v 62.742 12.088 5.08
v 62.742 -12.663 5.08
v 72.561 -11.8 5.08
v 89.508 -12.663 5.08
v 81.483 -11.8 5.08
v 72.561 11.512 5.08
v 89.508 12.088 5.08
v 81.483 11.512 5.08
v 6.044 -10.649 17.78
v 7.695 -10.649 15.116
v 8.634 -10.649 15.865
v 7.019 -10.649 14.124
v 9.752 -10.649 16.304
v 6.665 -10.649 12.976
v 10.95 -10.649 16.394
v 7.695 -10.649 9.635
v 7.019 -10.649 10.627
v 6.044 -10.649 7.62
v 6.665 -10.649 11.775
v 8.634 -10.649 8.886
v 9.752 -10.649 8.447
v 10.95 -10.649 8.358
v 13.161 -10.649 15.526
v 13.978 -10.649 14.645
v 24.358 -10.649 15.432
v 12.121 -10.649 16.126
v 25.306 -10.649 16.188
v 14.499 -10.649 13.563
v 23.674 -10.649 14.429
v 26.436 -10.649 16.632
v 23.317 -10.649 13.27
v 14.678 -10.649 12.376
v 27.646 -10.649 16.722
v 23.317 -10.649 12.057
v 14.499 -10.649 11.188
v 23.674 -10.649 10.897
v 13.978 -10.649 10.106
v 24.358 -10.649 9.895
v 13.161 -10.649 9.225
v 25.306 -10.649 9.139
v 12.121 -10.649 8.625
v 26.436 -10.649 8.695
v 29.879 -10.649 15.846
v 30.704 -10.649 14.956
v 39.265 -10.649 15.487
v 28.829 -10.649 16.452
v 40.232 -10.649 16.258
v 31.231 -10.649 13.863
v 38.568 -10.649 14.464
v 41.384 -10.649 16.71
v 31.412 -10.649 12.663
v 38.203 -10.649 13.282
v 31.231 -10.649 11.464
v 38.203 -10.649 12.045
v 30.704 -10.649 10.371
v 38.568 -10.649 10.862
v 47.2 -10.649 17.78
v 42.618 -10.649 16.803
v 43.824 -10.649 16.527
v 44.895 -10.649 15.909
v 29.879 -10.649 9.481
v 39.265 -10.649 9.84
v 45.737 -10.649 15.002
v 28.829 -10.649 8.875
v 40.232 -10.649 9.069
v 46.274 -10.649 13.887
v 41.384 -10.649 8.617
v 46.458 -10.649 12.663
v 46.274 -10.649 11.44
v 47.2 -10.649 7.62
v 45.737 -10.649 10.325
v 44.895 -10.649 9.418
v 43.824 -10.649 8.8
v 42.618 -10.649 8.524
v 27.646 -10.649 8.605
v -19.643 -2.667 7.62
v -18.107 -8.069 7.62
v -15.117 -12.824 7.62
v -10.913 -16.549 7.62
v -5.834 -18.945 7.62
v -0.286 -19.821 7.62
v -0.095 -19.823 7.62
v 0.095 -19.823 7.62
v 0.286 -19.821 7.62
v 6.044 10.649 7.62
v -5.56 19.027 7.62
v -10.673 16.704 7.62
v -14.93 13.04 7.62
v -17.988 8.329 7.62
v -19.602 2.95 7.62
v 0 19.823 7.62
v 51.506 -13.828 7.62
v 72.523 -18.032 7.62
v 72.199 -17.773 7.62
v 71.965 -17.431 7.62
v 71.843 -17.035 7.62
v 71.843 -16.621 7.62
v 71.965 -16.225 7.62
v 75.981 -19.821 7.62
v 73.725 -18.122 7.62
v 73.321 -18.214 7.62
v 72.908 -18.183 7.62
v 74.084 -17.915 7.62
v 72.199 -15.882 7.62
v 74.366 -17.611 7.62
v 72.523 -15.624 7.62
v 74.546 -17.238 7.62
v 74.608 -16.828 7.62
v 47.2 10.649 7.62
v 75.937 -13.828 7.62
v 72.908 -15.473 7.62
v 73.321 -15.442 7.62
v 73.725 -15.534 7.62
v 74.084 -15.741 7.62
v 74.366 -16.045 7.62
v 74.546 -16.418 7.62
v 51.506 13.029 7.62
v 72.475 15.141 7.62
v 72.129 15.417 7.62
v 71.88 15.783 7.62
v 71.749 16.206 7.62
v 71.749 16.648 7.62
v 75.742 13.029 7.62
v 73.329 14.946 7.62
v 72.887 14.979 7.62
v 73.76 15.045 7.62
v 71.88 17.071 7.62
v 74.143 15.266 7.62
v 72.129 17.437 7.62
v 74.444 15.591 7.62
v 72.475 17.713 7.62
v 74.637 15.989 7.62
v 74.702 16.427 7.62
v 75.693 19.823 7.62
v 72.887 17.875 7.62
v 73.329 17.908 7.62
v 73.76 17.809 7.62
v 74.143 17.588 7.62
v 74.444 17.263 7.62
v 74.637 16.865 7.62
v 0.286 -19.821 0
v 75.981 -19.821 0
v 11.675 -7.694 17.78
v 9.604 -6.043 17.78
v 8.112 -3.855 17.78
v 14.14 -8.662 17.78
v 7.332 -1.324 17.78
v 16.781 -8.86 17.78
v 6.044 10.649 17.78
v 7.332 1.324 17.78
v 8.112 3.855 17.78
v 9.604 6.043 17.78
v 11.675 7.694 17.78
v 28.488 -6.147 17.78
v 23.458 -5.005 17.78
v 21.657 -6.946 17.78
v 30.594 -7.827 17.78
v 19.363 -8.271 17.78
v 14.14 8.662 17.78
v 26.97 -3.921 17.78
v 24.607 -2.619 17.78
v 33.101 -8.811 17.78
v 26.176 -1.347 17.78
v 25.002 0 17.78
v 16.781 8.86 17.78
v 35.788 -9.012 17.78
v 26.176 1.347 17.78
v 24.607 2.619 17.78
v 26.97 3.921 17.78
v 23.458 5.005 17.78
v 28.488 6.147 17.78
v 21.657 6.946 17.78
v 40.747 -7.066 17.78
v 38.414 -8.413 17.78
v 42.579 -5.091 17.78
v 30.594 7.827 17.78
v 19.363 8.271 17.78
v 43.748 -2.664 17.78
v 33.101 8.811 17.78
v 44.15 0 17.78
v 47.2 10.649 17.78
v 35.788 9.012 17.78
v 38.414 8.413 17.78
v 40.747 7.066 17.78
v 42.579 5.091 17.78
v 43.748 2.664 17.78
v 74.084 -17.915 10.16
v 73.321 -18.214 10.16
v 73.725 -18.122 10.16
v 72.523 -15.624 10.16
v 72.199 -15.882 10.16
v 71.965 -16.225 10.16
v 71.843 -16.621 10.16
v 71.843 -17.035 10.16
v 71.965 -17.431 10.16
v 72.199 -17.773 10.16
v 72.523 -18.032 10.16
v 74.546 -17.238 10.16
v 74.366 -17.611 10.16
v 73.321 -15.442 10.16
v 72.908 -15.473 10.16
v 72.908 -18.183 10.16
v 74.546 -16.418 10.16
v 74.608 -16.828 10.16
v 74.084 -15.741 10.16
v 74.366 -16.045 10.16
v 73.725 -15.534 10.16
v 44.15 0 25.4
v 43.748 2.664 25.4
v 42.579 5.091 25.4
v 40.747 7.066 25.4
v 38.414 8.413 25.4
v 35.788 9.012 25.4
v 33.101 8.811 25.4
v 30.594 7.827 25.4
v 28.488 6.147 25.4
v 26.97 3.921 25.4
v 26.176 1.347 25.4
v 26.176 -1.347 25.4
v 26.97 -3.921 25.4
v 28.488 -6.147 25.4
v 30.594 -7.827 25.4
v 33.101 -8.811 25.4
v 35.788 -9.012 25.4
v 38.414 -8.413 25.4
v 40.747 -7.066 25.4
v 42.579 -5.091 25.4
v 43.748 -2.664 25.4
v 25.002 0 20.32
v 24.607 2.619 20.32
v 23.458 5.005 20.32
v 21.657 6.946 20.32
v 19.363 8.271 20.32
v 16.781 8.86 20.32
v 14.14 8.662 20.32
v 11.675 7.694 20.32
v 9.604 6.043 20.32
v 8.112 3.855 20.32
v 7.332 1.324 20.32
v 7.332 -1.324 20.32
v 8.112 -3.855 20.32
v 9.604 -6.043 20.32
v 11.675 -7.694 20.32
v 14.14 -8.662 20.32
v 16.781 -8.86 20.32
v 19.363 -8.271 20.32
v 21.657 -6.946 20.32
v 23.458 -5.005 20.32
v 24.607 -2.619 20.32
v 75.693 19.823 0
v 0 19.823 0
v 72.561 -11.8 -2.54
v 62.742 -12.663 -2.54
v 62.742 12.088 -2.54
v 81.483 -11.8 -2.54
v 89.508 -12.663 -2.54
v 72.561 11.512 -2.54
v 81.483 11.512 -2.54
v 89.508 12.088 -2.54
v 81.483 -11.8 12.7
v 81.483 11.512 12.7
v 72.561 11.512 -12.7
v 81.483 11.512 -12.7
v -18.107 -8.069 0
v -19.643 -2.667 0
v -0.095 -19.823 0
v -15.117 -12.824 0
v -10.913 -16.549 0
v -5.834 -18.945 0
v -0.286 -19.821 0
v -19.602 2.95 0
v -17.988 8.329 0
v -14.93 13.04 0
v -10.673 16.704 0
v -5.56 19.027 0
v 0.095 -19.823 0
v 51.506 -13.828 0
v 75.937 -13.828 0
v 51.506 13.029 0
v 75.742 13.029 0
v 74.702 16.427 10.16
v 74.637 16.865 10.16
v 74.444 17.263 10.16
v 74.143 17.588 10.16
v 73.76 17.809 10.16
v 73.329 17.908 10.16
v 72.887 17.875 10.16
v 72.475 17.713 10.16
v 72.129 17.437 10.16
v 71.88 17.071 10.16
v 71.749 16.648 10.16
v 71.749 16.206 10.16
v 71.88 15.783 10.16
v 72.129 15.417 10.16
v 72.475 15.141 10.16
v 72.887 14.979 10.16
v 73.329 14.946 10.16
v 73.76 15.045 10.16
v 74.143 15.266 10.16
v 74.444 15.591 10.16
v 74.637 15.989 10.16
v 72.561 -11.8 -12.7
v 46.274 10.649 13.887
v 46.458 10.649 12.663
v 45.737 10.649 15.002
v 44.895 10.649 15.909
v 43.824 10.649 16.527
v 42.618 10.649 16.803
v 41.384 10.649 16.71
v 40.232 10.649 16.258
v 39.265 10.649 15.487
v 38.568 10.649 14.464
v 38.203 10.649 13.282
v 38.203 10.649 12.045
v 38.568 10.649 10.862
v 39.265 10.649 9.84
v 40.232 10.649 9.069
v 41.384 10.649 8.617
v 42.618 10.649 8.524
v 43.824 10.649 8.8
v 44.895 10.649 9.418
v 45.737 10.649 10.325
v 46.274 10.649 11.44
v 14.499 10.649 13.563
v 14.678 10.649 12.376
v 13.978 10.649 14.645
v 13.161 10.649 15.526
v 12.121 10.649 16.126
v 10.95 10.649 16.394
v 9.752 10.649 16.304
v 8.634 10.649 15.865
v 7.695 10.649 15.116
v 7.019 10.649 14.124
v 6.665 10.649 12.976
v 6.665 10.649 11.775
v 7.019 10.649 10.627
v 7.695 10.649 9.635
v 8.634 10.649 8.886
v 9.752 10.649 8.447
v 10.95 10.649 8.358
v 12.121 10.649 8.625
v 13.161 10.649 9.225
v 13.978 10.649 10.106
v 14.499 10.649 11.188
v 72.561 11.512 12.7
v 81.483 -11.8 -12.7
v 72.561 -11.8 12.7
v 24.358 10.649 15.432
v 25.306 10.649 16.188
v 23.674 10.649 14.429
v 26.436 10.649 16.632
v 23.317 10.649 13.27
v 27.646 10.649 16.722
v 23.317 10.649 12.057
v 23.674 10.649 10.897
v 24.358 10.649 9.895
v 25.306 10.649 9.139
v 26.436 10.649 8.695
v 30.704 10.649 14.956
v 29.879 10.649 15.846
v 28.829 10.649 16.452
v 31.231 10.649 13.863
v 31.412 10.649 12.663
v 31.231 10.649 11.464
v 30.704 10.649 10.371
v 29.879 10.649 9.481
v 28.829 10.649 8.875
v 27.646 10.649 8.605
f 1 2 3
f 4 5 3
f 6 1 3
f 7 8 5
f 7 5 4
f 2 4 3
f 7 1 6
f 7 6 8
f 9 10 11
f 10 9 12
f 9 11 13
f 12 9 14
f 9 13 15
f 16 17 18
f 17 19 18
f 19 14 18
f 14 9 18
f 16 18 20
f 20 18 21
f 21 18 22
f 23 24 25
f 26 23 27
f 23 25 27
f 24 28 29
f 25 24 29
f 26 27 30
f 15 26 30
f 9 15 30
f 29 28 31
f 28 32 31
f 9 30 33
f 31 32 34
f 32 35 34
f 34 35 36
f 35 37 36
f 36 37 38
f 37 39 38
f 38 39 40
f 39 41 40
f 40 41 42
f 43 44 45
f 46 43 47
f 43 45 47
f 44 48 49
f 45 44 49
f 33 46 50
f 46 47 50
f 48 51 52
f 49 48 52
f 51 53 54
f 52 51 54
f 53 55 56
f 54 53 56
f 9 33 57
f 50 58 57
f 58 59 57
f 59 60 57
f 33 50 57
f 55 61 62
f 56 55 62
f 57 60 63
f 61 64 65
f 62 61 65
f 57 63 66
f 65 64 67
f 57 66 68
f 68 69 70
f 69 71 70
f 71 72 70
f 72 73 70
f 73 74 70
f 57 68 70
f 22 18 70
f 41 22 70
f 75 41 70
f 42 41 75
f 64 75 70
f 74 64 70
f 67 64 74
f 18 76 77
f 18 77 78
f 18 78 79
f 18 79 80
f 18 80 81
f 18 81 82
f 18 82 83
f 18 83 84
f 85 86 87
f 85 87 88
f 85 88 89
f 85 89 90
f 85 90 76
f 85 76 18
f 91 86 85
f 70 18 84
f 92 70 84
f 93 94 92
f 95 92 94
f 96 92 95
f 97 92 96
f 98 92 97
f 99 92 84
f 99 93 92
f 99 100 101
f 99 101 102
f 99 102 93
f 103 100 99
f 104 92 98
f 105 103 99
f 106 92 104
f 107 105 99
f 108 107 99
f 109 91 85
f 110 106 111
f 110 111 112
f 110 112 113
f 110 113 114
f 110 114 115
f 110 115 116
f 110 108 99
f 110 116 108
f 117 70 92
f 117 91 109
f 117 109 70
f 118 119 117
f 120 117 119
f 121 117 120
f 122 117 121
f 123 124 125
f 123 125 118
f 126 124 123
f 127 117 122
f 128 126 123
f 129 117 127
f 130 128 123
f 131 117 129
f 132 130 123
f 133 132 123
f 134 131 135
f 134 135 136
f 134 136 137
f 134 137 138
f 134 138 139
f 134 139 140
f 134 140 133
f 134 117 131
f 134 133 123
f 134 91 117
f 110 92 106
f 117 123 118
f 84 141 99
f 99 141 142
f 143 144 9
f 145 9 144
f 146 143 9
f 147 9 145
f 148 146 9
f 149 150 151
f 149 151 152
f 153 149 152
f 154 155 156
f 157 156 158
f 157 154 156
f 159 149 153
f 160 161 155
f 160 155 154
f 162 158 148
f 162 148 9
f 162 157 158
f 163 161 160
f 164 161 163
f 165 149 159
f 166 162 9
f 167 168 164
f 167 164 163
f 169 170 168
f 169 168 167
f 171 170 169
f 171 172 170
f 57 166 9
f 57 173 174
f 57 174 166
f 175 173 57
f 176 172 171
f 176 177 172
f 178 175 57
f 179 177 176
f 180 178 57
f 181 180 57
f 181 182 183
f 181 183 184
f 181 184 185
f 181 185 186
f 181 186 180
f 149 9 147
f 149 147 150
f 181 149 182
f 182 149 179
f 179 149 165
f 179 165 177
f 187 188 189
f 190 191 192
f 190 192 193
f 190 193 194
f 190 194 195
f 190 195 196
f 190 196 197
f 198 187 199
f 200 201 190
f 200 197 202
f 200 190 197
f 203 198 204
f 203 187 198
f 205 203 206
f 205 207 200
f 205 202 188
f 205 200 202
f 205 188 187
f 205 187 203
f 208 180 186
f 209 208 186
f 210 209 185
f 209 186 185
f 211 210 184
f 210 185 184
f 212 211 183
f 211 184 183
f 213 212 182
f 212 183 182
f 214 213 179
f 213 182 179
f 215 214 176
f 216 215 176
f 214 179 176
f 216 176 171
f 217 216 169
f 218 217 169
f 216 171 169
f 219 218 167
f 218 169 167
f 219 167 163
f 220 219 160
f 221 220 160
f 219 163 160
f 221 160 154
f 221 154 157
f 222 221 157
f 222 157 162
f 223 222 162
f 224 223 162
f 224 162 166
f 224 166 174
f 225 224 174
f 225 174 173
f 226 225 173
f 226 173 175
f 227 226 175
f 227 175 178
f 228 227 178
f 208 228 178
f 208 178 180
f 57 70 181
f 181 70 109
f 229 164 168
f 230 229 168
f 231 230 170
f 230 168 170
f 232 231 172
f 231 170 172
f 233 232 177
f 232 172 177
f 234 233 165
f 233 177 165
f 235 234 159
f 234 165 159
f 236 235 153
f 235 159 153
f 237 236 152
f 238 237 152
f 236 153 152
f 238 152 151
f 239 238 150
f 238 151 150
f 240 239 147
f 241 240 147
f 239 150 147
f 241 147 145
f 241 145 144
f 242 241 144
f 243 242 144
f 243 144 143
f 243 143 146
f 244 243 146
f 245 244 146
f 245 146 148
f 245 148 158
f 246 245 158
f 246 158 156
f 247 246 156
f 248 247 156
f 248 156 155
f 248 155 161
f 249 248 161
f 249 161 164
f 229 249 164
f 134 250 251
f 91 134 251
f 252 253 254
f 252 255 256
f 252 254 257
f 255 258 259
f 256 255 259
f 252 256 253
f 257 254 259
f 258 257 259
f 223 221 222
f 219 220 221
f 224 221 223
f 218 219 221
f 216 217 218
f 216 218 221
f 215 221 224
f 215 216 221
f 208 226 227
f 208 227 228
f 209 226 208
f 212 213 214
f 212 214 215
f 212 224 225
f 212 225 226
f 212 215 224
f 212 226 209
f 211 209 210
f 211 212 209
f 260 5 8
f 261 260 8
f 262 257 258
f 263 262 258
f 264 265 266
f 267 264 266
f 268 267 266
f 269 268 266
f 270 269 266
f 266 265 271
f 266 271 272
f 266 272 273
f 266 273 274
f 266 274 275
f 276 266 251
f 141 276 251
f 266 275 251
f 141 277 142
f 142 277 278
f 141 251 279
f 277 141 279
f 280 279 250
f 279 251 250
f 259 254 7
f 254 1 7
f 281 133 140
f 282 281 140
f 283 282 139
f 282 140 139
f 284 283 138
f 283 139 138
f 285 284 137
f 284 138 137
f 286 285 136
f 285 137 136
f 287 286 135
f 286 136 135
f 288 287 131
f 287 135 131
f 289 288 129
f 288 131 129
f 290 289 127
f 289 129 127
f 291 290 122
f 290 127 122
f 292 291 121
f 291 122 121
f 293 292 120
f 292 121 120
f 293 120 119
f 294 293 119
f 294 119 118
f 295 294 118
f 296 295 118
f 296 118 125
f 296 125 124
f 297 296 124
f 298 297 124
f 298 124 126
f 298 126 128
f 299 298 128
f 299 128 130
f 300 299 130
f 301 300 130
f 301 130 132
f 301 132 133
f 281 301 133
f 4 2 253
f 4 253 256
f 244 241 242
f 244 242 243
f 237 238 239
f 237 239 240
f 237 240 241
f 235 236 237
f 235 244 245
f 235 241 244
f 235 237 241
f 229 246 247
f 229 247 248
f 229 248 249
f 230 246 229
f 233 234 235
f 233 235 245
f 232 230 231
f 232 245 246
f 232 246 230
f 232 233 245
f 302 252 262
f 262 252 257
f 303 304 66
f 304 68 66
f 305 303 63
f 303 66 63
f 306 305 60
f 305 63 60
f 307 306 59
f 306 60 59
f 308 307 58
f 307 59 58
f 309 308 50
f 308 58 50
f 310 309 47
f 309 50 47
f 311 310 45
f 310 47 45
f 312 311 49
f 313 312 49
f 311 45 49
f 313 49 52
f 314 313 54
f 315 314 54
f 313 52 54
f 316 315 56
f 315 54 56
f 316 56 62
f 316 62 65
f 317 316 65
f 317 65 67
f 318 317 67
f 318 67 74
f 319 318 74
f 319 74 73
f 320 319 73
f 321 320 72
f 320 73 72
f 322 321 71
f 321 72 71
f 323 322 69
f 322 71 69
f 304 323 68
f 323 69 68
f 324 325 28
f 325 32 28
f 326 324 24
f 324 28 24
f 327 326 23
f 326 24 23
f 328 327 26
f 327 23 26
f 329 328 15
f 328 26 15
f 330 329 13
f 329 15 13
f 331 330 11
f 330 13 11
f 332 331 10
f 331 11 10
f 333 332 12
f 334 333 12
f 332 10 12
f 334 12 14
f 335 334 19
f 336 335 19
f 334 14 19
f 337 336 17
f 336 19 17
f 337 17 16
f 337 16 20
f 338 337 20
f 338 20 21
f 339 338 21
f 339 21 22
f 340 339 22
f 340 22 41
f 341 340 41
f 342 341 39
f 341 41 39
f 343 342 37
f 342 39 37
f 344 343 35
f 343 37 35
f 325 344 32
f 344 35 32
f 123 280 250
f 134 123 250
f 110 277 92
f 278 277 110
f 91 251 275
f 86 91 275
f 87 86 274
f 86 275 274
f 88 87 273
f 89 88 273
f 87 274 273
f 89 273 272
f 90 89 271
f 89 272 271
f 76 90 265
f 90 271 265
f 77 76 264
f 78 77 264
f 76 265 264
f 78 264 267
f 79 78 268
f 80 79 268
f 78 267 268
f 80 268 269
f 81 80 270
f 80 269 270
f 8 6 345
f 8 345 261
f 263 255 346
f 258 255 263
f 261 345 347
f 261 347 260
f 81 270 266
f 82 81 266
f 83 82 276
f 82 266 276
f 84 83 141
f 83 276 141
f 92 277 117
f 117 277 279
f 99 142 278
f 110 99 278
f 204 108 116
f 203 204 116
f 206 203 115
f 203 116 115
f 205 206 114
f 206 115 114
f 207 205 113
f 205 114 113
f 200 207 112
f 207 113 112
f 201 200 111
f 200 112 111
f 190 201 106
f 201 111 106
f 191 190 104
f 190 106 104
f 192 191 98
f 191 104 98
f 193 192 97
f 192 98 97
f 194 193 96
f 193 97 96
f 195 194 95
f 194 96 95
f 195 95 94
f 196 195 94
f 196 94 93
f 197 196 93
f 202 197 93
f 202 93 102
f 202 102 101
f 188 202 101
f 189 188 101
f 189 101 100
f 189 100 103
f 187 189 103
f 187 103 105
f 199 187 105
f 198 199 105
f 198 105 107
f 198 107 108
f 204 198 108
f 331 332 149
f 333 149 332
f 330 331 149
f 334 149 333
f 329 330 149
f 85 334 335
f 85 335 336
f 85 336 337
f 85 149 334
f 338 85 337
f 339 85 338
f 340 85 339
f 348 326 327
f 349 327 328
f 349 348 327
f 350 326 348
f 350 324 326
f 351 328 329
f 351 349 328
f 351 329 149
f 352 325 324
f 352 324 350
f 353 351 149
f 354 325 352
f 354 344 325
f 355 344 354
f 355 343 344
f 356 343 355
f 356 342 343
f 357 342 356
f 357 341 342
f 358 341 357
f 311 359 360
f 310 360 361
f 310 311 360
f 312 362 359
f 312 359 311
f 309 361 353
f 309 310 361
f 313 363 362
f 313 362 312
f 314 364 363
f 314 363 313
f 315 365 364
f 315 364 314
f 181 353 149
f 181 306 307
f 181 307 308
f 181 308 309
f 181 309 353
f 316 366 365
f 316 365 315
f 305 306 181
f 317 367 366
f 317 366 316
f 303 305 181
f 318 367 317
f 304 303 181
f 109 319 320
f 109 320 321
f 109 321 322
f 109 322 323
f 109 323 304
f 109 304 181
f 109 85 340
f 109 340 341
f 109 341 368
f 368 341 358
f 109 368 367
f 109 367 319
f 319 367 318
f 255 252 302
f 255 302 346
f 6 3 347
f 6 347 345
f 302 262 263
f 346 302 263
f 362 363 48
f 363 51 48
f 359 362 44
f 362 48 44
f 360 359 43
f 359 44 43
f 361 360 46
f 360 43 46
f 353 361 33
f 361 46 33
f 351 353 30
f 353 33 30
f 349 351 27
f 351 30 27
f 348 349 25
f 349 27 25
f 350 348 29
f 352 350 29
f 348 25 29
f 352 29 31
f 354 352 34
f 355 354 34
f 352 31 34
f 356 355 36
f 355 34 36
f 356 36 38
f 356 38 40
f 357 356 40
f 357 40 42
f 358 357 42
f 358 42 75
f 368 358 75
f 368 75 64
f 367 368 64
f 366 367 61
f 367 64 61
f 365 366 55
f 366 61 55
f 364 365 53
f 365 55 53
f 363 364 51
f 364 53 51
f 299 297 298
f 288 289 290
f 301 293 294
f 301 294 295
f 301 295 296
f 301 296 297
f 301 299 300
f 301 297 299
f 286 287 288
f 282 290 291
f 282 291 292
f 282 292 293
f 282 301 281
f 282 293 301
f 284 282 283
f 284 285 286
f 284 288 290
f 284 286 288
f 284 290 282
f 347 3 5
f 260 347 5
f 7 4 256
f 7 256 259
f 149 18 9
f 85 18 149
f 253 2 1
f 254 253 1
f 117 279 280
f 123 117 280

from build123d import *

# Parameters (mm, degrees)
F1_DEPTH       = 7.62
F2_W           = 17.2683522105
F2_H           = 26.7659360543
F3_DEPTH       = 12.7
F4_W           = 41.1562207155
F4_H           = 21.2976261973
F5_DEPTH       = 17.78
F6_R           = 8.8847627662
F7_DEPTH       = 20.32
F8_R           = 9.0372818925
F9_DEPTH       = 25.4
F10_R          = 4.0292833
F10_R_2        = 4.0701887274
F10_R_3        = 4.1507926028
F11_DEPTH      = 25.4
F11_DEPTH_BACK = 25.4
F12_W          = 26.7398282886
F12_H          = 26.8571125343
F13_DEPTH      = 25.4
F13_DEPTH_BACK = 25.4
F14_R          = 1.3901606725
F14_R_2        = 1.4848965251
F15_DEPTH      = 10.16
F16_W          = 26.7659276724
F16_H          = 24.7512953356
F17_DEPTH      = 5.08
F17_DEPTH_BACK = 2.54
F18_W          = 8.9219808578
F18_H          = 23.312266916
F19_DEPTH      = 12.7
F19_DEPTH_BACK = 12.7


with BuildPart() as f1:
    # F0 (on Top) → F1 (new body)
    with BuildSketch(Plane.XY):
        with BuildLine():
            ThreePointArc((0.2858653896, -19.8210498239), (14.1177632175, -13.9156206069), (19.8231111368, 0))
            ThreePointArc((19.8231111368, 0), (14.017056309, 14.017056309), (0, 19.8231111368))
            ThreePointArc((0, 19.8231111368), (-19.8225958019, 0.1429364107), (-0.2858653896, -19.8210498239))
            Line((-0.2858653896, -19.8210498239), (0.2858653896, -19.8210498239))
        make_face()
        with BuildLine():
            ThreePointArc((0, 19.8231111368), (14.017056309, 14.017056309), (19.8231111368, 0))
            ThreePointArc((19.8231111368, 0), (14.1177632175, -13.9156206069), (0.2858653896, -19.8210498239))
            Line((0.2858653896, -19.8210498239), (75.9807236174, -19.8210498239))
            Line((75.9807236174, -19.8210498239), (75.6929144263, 19.8231111368))
            Line((75.6929144263, 19.8231111368), (0, 19.8231111368))
        make_face()
        with BuildLine():
            ThreePointArc((-0.2858653896, -19.8210498239), (0, -19.8231111368), (0.2858653896, -19.8210498239))
            Line((0.2858653896, -19.8210498239), (-0.2858653896, -19.8210498239))
        make_face()
    extrude(amount=F1_DEPTH)

    # F2 (on face) → F3 (cut)
    with BuildSketch(Plane.XY.offset(7.62)):
        with Locations((60.1514019072, -0.4317085259)):
            Rectangle(F2_W, F2_H)
    extrude(amount=-F3_DEPTH, mode=Mode.SUBTRACT)

    # F4 (on Top) → F5 (join)
    with BuildSketch(Plane.XY):
        with Locations((26.6220329795, 0)):
            Rectangle(F4_W, F4_H)
    extrude(amount=F5_DEPTH)

    # F6 (on Top) → F7 (join)
    with BuildSketch(Plane.XY):
        with Locations((16.1171238869, 0)):
            Circle(F6_R)
    extrude(amount=F7_DEPTH)

    # F8 (on Top) → F9 (join)
    with BuildSketch(Plane.XY):
        with Locations((35.1123064756, 0)):
            Circle(F8_R)
    extrude(amount=F9_DEPTH)

    # F10 (on Front) → F11 (cut, two sides)
    with BuildSketch(Plane.XZ) as f11_sk:
        with Locations((10.6488121673, 12.3756472021)):
            Circle(F10_R)
        with Locations((27.3415446281, 12.6634538174)):
            Circle(F10_R_2)
        with Locations((42.3074476421, 12.6634538174)):
            Circle(F10_R_3)
    extrude(amount=F11_DEPTH, mode=Mode.SUBTRACT)
    extrude(f11_sk.sketch, amount=-F11_DEPTH_BACK, mode=Mode.SUBTRACT)

    # F12 (on Top) → F13 (cut, two sides)
    with BuildSketch(Plane.XY) as f13_sk:
        with Locations((64.8755095899, -0.3996533342)):
            Rectangle(F12_W, F12_H)
    extrude(amount=-F13_DEPTH, mode=Mode.SUBTRACT)
    extrude(f13_sk.sketch, amount=F13_DEPTH_BACK, mode=Mode.SUBTRACT)

    # F14 (on Top) → F15 (join)
    with BuildSketch(Plane.XY):
        with Locations((73.2175856829, -16.8278478086)):
            Circle(F14_R)
        with Locations((73.2175856829, 16.4269804955)):
            Circle(F14_R_2)
    extrude(amount=F15_DEPTH)


with BuildPart() as f17:
    # F16 (on Top) → F17 (new body, two sides)
    with BuildSketch(Plane.XY) as f17_sk:
        with Locations((76.1246234179, -0.2878061496)):
            Rectangle(F16_W, F16_H)
    extrude(amount=F17_DEPTH)
    extrude(f17_sk.sketch, amount=-F17_DEPTH_BACK)

    # F18 (on Top) → F19 (join, two sides)
    with BuildSketch(Plane.XY) as f19_sk:
        with Locations((77.0223066211, -0.1439023763)):
            Rectangle(F18_W, F18_H)
    extrude(amount=F19_DEPTH)
    extrude(f19_sk.sketch, amount=-F19_DEPTH_BACK)


solid = Compound([f1.part, f17.part])
